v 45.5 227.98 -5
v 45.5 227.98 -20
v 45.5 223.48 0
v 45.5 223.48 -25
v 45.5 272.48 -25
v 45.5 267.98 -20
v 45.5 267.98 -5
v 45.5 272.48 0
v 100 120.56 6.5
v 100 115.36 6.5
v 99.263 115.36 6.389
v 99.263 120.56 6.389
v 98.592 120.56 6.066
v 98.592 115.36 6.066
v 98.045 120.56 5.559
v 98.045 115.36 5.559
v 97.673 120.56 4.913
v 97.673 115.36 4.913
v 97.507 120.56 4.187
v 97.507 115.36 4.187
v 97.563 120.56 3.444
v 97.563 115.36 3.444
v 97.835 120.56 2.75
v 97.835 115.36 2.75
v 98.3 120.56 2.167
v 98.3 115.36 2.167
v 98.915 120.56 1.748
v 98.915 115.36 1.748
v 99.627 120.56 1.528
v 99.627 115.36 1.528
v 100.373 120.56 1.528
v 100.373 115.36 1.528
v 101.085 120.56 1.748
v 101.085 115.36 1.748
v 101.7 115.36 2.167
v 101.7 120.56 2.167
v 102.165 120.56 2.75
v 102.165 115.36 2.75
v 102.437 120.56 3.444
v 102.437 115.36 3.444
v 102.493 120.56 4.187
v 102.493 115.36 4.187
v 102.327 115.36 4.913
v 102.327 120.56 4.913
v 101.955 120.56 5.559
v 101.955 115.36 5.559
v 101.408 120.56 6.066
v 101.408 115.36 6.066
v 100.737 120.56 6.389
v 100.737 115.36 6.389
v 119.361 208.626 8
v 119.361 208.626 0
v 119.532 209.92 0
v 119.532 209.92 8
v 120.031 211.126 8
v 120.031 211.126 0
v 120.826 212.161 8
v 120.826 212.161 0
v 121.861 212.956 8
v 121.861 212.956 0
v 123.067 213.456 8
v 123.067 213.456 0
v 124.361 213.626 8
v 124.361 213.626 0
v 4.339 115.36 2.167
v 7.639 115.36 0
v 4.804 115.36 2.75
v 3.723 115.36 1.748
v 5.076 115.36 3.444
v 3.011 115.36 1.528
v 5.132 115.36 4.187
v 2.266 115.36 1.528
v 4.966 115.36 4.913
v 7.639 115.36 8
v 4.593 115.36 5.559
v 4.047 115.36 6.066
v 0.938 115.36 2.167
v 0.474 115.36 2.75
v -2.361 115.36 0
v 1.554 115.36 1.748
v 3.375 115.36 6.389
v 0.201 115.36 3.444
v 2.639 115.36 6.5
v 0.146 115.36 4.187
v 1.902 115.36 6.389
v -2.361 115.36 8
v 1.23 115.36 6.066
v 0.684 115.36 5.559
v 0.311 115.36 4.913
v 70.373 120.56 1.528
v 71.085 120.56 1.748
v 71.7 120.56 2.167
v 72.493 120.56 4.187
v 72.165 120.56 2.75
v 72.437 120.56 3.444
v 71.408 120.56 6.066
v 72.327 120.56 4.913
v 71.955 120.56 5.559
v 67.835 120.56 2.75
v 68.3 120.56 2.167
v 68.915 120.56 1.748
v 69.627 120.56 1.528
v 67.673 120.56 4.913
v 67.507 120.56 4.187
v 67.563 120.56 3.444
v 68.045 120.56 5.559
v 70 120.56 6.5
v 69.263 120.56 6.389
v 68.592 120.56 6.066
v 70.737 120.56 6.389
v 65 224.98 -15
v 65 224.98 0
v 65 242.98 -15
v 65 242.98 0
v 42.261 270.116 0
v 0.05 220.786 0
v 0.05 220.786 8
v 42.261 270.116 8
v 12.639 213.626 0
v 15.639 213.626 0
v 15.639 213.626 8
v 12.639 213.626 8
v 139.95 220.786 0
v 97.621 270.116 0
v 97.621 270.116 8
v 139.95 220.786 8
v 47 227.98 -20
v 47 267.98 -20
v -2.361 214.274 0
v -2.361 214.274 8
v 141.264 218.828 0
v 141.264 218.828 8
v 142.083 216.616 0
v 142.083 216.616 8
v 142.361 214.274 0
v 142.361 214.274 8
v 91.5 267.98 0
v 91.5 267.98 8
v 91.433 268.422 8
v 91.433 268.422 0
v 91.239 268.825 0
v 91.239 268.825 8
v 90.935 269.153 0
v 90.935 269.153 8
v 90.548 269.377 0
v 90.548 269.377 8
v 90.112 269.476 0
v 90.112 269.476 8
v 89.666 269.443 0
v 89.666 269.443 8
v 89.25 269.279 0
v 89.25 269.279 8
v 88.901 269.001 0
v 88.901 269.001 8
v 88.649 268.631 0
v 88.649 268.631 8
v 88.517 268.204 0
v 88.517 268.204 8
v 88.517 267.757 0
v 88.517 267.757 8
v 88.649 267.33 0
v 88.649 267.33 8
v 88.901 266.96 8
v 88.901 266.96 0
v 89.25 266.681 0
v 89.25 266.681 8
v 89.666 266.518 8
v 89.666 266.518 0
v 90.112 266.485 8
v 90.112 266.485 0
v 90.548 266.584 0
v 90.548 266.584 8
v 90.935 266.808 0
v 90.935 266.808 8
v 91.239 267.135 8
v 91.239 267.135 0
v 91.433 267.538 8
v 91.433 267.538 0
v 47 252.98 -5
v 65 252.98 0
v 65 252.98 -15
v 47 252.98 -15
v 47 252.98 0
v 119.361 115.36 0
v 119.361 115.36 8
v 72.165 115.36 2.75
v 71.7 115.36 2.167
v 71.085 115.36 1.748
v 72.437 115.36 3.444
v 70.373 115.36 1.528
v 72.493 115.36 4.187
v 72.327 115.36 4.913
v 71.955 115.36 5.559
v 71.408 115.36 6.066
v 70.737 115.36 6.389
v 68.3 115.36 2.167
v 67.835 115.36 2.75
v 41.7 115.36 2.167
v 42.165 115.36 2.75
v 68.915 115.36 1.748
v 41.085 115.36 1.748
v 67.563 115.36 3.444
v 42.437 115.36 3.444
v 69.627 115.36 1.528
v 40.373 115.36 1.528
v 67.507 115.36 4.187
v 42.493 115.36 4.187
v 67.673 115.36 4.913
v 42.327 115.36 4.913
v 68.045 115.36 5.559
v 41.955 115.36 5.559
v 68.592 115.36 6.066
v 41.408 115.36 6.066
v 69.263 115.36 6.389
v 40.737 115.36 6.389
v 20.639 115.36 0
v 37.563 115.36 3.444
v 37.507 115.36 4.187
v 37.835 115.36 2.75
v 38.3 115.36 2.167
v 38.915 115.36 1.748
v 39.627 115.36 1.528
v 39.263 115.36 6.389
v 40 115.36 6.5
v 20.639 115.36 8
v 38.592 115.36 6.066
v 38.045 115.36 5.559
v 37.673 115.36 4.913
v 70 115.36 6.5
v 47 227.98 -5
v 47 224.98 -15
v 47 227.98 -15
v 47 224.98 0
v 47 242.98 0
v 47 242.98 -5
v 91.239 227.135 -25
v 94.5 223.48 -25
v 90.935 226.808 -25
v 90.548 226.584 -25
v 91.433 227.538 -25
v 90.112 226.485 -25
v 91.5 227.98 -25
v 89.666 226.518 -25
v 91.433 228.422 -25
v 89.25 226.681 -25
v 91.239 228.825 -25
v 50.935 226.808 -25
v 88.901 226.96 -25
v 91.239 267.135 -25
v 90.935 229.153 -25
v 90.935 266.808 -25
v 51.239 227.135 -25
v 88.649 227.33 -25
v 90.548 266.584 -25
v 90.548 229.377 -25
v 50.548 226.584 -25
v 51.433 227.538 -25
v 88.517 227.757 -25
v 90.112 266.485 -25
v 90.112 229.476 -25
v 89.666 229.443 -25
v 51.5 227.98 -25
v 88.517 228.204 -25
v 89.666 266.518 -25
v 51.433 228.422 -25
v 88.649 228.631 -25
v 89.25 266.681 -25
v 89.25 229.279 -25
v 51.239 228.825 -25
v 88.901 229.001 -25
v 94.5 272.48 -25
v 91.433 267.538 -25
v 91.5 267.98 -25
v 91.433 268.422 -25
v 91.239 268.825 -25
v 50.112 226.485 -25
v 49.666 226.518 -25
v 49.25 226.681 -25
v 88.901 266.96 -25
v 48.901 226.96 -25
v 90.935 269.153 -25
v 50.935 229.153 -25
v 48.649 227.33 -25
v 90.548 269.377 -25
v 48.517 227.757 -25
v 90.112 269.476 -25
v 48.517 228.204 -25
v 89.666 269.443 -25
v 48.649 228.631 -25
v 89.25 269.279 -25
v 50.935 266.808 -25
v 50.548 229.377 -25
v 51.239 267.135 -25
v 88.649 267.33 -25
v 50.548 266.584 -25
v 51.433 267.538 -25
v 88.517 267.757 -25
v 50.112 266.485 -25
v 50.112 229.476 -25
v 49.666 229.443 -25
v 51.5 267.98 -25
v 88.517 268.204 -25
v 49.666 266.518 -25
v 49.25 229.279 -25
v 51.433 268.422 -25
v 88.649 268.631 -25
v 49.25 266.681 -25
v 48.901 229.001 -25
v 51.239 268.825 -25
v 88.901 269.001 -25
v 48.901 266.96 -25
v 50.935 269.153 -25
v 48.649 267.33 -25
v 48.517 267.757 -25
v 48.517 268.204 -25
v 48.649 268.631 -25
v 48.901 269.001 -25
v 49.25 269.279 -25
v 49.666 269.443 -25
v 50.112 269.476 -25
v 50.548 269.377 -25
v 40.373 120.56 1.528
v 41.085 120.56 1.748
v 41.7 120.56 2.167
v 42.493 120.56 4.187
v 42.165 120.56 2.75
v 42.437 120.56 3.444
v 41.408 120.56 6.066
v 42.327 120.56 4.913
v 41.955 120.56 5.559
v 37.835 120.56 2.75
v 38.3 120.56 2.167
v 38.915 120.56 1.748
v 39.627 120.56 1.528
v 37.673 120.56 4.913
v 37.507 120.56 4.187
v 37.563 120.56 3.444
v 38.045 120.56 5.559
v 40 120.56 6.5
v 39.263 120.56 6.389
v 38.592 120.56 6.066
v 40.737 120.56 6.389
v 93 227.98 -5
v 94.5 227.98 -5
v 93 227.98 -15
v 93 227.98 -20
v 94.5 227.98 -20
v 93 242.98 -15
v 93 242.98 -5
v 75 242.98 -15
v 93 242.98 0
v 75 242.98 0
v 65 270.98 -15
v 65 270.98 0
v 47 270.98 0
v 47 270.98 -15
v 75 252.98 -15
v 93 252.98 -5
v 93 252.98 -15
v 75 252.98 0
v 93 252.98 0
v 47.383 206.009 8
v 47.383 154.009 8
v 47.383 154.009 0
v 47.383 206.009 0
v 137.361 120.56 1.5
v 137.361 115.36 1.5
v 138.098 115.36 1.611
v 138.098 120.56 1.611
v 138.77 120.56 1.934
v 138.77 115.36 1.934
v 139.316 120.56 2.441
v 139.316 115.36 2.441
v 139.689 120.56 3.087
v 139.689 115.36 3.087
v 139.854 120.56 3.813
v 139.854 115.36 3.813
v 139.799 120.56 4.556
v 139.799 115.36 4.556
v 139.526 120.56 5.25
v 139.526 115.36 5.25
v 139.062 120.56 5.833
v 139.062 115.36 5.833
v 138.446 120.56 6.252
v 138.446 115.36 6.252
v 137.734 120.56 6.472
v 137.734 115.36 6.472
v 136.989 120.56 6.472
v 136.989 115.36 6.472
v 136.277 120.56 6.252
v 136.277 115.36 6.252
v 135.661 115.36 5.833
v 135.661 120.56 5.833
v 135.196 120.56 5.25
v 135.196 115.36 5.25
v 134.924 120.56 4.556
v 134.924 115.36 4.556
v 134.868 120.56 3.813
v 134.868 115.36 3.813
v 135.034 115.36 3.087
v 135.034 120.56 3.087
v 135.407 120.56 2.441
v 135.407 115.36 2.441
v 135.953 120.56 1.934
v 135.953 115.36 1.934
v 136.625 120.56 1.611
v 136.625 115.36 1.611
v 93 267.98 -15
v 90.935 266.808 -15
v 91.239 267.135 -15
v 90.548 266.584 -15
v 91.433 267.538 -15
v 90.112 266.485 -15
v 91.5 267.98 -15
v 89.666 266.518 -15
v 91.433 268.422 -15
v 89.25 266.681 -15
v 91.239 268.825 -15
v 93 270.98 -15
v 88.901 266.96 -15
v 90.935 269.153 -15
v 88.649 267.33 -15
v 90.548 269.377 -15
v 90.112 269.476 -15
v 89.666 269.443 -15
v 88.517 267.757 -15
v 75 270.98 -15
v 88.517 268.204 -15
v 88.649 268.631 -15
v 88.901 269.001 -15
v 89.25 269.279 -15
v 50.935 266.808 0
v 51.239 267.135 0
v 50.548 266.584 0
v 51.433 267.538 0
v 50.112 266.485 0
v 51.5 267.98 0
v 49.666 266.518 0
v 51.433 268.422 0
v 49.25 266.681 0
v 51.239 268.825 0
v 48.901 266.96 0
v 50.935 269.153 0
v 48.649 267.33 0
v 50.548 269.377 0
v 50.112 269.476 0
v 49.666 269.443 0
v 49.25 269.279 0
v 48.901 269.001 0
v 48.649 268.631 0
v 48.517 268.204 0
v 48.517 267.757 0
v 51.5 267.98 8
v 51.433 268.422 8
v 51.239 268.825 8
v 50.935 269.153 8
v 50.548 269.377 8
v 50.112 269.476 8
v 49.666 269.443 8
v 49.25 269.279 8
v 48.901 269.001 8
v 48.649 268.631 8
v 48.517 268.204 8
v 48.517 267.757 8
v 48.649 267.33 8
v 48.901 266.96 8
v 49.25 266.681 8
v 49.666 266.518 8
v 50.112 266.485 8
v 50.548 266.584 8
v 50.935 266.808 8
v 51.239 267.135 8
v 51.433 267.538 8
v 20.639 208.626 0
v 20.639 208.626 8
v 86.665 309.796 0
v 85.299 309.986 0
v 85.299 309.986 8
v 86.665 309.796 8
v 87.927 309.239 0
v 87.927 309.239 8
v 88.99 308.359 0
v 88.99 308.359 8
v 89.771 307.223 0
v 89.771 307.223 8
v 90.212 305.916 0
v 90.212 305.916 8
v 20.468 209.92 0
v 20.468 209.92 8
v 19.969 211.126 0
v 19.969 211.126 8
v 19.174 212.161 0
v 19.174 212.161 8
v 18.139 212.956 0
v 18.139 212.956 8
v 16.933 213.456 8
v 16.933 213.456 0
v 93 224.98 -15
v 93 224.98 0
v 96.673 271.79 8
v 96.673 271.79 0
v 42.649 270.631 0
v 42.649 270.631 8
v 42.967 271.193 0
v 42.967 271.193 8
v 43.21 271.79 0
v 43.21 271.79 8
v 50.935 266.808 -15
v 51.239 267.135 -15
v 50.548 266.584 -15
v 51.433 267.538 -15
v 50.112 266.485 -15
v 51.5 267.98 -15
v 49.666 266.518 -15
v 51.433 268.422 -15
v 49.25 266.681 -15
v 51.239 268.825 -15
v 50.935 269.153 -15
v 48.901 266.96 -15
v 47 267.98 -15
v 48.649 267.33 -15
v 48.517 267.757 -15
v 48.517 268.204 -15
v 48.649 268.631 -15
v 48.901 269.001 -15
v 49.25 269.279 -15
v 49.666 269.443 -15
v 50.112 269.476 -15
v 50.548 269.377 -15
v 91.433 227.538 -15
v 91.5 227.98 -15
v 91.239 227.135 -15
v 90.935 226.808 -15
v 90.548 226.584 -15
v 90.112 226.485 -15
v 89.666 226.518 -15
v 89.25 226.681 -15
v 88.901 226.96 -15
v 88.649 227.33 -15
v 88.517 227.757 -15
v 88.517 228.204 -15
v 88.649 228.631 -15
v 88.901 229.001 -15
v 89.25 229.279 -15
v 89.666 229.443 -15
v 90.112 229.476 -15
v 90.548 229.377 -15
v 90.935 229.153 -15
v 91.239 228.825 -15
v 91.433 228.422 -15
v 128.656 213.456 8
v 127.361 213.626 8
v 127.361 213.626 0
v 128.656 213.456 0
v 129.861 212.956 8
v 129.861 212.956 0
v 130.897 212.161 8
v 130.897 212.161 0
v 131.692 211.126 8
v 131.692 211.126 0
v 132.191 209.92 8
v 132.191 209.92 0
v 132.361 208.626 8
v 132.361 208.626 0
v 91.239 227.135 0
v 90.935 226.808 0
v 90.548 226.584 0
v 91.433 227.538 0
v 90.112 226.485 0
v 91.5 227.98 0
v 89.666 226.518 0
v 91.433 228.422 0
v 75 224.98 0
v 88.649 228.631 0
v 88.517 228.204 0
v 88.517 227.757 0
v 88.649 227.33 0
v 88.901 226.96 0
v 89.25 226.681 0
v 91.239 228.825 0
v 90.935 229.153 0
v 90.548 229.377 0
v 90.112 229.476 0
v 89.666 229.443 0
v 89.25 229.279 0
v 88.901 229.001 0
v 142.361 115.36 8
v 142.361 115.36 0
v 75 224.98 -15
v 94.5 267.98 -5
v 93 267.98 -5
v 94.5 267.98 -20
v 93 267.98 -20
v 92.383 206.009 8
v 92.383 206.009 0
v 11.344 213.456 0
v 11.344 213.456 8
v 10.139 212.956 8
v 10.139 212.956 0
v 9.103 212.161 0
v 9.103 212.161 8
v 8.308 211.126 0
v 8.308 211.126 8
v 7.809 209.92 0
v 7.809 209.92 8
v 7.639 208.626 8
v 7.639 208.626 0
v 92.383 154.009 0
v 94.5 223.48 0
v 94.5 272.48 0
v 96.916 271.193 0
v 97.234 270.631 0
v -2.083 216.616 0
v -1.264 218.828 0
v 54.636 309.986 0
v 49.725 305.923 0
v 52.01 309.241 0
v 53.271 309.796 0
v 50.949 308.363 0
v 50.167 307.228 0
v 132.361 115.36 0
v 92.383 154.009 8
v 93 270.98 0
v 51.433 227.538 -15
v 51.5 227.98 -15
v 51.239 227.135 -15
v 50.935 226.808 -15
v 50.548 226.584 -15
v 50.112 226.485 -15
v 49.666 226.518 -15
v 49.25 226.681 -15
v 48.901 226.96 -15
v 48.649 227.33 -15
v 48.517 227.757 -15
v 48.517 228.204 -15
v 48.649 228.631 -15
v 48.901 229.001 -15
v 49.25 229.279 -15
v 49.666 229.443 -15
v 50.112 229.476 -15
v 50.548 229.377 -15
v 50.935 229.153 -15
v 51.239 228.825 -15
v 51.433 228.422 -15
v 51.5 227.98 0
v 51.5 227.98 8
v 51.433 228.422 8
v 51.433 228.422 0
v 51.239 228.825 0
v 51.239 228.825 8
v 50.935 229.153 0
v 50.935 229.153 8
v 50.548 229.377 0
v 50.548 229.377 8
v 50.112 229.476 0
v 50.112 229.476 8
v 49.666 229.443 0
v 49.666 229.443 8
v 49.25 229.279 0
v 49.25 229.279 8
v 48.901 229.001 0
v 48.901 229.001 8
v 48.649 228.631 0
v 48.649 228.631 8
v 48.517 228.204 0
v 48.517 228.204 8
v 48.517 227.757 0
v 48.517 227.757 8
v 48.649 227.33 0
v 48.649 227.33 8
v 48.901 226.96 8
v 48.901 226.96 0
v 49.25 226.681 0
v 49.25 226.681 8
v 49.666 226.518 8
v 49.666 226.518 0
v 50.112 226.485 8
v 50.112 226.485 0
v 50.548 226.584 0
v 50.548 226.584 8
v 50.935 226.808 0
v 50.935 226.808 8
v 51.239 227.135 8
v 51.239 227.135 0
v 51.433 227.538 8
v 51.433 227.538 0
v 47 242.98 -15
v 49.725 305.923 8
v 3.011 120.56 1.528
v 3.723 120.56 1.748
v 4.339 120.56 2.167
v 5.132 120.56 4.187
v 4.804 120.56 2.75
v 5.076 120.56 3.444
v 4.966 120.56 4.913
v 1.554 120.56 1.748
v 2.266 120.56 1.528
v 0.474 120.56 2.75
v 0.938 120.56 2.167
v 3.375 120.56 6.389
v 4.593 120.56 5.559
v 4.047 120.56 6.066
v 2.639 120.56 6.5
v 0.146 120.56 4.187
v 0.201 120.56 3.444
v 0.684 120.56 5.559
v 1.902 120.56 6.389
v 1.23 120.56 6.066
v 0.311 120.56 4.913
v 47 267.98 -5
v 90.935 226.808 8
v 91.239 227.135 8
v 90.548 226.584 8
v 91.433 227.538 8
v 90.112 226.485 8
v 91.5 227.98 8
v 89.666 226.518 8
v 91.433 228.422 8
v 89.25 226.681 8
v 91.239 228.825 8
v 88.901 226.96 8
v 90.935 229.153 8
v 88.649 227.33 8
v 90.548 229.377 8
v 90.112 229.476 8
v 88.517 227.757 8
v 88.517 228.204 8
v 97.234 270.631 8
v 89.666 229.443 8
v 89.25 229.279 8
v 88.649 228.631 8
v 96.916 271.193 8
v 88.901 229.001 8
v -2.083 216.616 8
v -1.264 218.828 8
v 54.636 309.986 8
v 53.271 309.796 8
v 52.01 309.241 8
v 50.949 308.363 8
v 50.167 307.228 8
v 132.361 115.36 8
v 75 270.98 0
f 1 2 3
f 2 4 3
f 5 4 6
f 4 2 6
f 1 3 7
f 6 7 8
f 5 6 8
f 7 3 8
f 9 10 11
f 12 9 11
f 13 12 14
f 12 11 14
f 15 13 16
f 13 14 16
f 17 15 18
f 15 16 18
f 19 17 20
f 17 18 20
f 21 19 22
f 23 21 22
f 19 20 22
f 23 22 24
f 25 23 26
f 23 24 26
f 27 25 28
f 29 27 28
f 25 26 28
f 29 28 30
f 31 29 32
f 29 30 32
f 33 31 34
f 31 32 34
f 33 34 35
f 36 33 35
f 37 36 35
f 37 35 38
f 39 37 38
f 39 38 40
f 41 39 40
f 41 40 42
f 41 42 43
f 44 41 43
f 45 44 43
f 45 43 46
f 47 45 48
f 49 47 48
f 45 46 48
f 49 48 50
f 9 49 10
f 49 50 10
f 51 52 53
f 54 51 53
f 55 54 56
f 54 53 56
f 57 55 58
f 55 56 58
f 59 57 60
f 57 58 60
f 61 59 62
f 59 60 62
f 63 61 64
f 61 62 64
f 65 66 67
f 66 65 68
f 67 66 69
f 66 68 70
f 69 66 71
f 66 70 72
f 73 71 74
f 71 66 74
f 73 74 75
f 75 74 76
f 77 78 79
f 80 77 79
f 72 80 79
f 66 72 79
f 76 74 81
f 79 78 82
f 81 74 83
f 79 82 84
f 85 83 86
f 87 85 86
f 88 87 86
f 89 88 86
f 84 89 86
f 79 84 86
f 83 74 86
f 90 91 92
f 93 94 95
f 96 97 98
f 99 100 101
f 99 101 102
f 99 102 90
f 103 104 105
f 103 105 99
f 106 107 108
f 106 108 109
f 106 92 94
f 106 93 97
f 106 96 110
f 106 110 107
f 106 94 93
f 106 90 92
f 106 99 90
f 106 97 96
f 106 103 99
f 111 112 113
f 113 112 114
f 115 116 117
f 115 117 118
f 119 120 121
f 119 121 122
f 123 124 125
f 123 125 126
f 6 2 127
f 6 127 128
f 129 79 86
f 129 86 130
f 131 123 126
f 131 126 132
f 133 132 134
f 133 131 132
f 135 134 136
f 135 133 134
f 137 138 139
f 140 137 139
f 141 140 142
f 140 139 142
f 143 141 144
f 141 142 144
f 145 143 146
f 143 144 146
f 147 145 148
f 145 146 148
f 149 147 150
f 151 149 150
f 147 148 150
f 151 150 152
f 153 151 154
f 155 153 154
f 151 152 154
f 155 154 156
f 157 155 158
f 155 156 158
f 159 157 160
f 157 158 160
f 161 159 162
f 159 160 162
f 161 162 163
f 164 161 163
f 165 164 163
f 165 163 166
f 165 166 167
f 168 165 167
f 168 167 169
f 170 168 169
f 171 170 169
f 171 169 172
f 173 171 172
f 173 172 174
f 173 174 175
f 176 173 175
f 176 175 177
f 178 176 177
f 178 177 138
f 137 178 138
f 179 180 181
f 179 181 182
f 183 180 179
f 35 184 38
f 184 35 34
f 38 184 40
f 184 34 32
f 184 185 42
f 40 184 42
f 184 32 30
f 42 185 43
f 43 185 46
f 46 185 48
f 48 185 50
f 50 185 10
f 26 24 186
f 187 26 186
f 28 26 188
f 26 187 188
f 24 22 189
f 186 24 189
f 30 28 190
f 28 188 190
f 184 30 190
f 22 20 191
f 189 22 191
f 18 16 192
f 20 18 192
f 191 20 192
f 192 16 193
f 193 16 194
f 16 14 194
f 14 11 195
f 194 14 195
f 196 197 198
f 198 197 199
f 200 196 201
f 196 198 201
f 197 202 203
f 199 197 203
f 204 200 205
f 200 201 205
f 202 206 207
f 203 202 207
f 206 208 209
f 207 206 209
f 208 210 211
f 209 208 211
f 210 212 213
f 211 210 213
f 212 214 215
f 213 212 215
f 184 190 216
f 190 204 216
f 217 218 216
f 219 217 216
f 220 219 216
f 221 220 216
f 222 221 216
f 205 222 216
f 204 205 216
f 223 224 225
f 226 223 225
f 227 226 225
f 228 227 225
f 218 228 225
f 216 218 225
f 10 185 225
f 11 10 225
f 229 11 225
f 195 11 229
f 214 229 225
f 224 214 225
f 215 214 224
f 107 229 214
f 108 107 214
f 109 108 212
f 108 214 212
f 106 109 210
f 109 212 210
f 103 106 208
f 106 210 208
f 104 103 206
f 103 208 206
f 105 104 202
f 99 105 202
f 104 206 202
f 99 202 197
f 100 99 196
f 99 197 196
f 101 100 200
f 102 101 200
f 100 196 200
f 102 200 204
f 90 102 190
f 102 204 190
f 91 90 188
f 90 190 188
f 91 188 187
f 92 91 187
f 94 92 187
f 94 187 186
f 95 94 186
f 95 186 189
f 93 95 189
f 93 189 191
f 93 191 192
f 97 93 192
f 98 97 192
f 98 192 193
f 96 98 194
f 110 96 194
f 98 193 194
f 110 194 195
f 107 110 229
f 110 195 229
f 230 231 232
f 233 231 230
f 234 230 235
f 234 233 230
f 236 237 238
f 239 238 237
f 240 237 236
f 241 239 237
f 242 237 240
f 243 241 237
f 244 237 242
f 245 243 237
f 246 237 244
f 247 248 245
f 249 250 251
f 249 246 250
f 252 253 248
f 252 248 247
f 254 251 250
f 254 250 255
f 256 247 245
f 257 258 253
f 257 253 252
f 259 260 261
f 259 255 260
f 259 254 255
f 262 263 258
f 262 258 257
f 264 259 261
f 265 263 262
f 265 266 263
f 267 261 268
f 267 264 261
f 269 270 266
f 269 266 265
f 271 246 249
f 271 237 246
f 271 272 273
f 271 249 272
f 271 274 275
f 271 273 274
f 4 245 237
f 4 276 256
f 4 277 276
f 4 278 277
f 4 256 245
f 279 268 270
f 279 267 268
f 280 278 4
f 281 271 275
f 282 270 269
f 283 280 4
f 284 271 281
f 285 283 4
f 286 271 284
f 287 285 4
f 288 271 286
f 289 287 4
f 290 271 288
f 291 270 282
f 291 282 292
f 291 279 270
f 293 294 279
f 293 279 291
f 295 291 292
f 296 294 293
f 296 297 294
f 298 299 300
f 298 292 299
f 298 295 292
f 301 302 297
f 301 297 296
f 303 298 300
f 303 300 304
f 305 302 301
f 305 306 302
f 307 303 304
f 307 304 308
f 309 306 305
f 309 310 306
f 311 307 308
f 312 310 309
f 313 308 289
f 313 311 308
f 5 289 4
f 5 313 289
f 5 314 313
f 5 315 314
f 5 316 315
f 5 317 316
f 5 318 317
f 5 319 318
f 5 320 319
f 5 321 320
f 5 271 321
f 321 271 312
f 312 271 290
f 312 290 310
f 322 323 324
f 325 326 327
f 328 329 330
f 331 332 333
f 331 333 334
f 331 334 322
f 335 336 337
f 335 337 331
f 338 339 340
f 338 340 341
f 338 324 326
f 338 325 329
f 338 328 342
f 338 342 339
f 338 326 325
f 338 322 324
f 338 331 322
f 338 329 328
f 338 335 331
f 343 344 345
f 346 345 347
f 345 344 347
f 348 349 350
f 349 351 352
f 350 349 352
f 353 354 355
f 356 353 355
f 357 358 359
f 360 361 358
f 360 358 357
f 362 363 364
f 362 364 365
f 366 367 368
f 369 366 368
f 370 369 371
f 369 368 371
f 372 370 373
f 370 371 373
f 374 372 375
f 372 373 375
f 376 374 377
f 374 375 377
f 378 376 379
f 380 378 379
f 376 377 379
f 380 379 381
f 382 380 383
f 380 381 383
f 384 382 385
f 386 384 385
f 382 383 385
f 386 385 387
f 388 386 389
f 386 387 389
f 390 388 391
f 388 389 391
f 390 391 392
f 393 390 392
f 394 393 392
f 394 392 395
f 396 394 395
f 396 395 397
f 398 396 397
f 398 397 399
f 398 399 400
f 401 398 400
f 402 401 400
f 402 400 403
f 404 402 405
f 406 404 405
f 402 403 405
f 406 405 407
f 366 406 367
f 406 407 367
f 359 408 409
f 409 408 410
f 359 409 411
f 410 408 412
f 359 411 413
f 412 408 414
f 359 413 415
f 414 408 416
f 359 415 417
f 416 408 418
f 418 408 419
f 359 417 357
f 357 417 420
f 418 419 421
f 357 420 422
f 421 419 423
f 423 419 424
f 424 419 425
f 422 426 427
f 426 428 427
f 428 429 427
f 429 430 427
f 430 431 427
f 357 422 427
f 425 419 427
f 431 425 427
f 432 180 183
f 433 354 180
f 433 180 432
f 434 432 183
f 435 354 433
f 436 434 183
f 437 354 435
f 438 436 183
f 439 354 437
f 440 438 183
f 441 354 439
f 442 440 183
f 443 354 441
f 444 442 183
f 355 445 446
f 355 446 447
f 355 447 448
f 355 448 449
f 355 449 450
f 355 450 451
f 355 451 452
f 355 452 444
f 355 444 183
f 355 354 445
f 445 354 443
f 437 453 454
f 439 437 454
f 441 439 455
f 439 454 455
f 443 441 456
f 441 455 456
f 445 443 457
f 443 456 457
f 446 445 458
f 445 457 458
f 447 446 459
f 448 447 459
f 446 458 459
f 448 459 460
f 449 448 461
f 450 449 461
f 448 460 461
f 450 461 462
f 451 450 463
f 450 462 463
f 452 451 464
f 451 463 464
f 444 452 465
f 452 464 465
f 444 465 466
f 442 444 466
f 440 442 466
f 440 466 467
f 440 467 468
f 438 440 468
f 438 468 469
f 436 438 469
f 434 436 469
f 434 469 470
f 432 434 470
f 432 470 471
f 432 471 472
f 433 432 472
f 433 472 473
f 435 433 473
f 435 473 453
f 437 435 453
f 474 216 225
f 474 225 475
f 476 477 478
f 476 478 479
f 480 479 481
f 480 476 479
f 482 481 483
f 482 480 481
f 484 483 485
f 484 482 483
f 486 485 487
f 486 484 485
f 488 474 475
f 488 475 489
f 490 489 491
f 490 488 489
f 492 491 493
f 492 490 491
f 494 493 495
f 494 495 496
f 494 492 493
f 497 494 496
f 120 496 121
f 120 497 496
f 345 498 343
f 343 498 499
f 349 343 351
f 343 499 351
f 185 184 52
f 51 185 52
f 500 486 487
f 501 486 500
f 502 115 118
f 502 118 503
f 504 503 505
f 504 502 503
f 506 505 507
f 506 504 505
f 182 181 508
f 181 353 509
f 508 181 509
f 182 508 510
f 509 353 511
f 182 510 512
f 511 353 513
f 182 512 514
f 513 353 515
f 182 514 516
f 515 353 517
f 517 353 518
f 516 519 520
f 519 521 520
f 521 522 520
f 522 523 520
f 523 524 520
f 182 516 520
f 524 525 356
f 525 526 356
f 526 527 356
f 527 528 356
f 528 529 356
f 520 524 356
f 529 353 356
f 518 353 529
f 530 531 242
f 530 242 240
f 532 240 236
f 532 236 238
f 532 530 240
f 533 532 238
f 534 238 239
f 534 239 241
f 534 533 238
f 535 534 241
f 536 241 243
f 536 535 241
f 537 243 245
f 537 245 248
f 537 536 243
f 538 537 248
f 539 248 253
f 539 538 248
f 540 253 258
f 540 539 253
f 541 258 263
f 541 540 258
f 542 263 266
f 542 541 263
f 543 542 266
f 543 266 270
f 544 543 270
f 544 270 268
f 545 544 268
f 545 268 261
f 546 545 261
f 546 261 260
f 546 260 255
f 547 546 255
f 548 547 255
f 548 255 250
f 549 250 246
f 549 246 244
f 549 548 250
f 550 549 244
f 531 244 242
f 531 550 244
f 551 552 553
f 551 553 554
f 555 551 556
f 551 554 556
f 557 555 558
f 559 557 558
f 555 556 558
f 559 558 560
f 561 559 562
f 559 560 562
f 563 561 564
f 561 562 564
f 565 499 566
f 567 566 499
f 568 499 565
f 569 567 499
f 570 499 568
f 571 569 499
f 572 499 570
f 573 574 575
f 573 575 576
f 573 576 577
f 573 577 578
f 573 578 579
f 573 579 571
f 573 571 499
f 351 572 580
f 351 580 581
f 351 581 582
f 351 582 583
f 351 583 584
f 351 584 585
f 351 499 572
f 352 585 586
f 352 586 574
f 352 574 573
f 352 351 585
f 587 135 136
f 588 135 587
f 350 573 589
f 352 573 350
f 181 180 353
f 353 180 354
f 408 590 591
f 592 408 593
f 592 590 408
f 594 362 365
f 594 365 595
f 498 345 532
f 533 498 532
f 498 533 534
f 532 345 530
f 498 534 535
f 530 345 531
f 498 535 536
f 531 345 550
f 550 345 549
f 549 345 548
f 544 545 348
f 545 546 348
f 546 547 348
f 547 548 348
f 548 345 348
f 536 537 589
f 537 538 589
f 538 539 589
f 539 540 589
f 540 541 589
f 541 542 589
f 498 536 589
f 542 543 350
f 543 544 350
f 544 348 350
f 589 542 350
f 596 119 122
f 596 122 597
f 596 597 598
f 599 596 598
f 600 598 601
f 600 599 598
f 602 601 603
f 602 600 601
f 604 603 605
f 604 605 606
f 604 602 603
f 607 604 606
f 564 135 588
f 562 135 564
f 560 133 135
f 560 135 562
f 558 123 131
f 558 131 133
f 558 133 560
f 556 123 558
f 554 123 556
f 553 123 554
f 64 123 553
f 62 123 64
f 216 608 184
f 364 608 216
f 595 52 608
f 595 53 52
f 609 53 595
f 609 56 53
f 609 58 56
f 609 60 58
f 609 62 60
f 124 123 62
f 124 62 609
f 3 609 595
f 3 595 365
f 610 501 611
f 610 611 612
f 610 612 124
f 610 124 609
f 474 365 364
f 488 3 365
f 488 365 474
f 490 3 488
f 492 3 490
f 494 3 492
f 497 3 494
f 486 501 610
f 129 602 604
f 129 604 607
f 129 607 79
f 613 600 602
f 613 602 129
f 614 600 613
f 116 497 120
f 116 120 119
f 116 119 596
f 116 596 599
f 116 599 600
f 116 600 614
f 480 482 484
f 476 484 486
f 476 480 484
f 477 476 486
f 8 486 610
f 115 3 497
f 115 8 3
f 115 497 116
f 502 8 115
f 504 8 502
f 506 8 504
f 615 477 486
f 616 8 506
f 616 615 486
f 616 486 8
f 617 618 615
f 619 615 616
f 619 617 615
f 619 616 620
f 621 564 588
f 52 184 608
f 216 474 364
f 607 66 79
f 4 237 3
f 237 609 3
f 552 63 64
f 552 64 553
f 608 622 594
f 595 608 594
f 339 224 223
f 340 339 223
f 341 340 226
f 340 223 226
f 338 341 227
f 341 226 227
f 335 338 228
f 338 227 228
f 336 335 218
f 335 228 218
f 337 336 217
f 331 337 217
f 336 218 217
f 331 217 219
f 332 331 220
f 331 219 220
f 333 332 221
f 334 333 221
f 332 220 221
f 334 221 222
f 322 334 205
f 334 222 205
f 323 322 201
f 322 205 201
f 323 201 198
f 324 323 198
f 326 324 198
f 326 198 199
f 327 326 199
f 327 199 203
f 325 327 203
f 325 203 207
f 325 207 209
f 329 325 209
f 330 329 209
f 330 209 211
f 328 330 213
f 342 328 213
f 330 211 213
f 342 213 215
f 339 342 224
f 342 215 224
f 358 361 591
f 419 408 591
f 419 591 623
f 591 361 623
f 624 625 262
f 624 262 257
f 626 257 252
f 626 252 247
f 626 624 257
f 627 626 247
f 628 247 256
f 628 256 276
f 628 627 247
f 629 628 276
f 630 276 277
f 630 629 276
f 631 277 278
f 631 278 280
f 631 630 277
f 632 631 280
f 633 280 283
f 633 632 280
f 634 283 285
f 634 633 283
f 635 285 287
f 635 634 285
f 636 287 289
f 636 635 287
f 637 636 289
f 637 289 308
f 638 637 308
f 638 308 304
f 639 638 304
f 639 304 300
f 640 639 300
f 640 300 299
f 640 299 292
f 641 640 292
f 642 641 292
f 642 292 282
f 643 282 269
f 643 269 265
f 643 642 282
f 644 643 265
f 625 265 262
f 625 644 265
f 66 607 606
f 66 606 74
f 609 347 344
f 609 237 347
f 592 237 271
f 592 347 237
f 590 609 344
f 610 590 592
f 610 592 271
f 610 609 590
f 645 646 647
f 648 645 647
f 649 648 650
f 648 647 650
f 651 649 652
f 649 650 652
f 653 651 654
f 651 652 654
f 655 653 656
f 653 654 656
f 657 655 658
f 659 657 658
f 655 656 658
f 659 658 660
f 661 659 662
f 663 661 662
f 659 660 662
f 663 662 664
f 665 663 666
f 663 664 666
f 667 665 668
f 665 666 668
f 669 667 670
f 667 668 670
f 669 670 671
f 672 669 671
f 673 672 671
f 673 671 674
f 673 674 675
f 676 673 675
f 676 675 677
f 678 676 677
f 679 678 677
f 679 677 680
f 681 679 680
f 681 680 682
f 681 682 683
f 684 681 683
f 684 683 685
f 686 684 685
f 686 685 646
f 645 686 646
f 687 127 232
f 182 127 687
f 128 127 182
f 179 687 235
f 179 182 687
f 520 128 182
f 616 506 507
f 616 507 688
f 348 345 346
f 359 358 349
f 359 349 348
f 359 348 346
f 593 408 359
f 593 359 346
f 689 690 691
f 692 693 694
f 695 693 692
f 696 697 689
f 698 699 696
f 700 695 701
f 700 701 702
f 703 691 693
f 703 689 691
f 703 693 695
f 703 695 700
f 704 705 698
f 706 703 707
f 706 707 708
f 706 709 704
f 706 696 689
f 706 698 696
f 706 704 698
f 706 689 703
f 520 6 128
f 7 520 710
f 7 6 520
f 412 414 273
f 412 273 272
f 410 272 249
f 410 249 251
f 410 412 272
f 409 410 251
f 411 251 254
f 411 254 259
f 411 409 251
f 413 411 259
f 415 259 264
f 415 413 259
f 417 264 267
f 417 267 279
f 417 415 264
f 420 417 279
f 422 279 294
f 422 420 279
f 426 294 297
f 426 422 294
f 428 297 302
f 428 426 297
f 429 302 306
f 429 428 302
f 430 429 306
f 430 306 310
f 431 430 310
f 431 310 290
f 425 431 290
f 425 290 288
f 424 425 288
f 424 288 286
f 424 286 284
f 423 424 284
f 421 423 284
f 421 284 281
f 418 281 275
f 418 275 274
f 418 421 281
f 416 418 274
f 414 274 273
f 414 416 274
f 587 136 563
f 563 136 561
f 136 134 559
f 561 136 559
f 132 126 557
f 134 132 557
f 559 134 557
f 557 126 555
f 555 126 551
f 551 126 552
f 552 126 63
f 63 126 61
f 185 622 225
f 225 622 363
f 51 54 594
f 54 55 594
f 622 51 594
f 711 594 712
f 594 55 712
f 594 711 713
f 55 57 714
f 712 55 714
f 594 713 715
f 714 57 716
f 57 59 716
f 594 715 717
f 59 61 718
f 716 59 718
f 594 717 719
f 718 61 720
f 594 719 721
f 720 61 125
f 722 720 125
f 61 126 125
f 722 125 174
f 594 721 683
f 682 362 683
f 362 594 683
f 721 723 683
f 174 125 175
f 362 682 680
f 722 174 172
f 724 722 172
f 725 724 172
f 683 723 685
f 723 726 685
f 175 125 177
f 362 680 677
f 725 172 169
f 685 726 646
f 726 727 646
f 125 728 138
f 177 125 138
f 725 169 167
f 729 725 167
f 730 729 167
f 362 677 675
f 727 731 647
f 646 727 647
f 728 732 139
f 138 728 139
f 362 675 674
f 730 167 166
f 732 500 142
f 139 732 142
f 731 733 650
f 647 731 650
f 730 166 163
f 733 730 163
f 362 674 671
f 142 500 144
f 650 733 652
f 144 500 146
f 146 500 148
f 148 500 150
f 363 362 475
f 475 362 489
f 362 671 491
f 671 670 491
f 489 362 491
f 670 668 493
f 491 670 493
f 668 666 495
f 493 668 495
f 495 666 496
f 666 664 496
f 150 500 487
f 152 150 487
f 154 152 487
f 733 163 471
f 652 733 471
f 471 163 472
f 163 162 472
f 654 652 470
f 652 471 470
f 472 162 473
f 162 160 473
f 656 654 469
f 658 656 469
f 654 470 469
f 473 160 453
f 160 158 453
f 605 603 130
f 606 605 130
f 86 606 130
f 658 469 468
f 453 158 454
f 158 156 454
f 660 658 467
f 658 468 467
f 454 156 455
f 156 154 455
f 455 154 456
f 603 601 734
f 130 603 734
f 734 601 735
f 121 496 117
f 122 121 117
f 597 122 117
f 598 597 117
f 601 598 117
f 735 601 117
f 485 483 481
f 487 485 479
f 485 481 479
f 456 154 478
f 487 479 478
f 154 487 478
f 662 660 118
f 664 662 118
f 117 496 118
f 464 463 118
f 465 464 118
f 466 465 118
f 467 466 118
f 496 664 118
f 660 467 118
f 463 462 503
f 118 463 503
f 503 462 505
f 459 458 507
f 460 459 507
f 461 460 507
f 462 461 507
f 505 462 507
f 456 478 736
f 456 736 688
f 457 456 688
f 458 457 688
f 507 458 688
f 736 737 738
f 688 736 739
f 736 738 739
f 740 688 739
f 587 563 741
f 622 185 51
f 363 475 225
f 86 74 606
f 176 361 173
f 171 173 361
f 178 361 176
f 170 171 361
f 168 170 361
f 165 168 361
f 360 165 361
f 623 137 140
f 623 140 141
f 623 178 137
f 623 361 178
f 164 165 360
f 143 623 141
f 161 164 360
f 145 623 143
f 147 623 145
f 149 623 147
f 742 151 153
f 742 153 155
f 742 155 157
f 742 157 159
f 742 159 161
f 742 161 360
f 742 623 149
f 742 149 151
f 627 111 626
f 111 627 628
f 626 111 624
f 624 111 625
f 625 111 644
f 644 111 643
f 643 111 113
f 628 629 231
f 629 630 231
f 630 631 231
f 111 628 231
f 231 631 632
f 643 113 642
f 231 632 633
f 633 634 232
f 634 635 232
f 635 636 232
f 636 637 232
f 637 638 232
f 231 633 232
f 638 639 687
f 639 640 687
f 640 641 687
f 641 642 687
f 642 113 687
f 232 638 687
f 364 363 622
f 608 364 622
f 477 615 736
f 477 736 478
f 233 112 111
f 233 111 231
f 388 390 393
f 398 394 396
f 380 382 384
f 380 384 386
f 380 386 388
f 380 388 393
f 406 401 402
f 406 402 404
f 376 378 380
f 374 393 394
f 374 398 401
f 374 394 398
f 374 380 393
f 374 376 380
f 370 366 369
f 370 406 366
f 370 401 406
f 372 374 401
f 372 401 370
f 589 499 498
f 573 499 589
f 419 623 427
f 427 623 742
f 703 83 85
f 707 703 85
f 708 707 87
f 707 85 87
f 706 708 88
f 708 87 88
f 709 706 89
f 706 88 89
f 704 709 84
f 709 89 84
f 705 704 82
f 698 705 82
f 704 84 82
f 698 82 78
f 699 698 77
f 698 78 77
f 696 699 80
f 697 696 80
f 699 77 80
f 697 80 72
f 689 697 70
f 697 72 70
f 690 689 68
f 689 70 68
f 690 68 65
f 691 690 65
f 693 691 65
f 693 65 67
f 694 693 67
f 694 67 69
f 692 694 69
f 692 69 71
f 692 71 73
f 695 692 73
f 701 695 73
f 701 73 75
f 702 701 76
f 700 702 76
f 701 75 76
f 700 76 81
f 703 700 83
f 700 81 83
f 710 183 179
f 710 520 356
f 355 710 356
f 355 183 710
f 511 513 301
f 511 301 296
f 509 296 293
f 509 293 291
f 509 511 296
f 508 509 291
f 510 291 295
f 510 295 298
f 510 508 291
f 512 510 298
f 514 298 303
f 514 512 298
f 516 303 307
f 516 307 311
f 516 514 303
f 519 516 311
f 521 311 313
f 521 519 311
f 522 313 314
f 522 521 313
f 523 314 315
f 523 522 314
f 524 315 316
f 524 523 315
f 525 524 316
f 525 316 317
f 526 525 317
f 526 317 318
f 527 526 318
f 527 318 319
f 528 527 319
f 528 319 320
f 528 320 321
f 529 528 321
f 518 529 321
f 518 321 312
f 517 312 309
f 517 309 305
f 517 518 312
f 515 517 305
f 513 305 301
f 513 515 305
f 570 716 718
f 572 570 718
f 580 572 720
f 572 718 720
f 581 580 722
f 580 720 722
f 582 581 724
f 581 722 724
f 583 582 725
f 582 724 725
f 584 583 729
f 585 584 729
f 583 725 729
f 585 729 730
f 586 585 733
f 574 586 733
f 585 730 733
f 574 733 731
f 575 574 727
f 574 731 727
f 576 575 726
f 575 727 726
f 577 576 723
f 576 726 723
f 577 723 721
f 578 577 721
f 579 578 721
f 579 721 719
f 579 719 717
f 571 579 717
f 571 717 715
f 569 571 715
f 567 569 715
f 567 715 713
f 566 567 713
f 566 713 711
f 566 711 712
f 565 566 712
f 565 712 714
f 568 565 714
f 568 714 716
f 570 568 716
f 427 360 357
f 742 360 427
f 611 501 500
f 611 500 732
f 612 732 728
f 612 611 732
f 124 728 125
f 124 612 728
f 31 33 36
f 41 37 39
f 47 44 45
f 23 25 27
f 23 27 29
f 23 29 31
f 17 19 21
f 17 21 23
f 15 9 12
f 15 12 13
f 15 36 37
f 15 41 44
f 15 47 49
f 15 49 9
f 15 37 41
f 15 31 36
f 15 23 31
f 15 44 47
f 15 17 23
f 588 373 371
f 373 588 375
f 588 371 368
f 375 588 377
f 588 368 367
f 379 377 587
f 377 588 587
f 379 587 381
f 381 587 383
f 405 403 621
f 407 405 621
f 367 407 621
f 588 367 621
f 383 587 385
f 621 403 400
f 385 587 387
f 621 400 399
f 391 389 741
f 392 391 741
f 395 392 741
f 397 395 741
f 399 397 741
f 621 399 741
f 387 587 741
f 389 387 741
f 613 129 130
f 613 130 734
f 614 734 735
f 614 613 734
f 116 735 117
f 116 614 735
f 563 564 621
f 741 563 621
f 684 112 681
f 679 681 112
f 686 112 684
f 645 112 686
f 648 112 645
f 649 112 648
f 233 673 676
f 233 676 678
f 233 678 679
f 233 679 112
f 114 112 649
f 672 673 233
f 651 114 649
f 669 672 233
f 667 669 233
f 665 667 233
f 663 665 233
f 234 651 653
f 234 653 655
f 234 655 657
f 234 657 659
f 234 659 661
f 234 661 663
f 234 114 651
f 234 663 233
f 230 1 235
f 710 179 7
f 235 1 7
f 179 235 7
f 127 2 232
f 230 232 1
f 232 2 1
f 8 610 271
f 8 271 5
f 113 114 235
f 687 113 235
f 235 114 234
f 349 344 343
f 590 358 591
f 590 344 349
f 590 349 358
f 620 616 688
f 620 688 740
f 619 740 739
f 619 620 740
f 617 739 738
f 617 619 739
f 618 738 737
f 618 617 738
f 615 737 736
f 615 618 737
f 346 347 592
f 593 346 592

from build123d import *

# Parameters (mm, degrees)
BOSS_EXTRUDE1_DEPTH    = 8
SKETCH2_W              = 45
SKETCH2_H              = 52
CUT_EXTRUDE1_DEPTH     = 342.206659287
SPLIT1_SURFACE_1_BACK  = 343.199
SPLIT1_SURFACE_1_DEPTH = 686.398
SPLIT1_SURFACE_2_BACK  = 343.199
SPLIT1_SURFACE_2_DEPTH = 686.398
SKETCH5_R              = 2.5
CUT_EXTRUDE6_DEPTH     = 5.2
SKETCH4_R              = 2.5
CUT_EXTRUDE7_DEPTH     = 5.2
SKETCH6_R              = 1.5
CUT_EXTRUDE8_DEPTH     = 342.206659287
SKETCH7_W              = 49
SKETCH7_H              = 49
SKETCH7_W_2            = 18
SKETCH7_H_2            = 18
BOSS_EXTRUDE2_DEPTH    = 15
SKETCH8_W              = 49
SKETCH8_H              = 49
SKETCH8_R              = 1.5
BOSS_EXTRUDE3_DEPTH    = 10
SKETCH9_W              = 15
SKETCH9_H              = 40
CUT_EXTRUDE9_DEPTH     = 1.5
SKETCH11_W             = 15
SKETCH11_H             = 40
CUT_EXTRUDE10_DEPTH    = 1.5


with BuildPart() as part:
    # Sketch1 → Boss-Extrude1 (new body)
    with BuildSketch(Plane.XY):
        with BuildLine():
            Line((70, 309.985818768), (85.299227191, 309.985818768))
            ThreePointArc((85.299227191, 309.985818768), (88.489017574, 308.836174247), (90.211957942, 305.915913694))
            Line((90.211957942, 305.915913694), (96.672728921, 271.790334282))
            ThreePointArc((96.672728921, 271.790334282), (97.06575438, 270.906904614), (97.621470019, 270.115641625))
            Line((97.621470019, 270.115641625), (139.950460317, 220.786053348))
            ThreePointArc((139.950460317, 220.786053348), (141.739336996, 217.746026552), (142.361429131, 214.274017901))
            Line((142.361429131, 214.274017901), (142.361429131, 30.859943174))
            ThreePointArc((142.361429131, 30.859943174), (140.896963037, 27.324409268), (137.361429131, 25.859943174))
            Line((137.361429131, 25.859943174), (114.717190871, 25.782318449))
            ThreePointArc((114.717190871, 25.782318449), (112.681998989, 25.341726514), (111.002773989, 24.110332733))
            Line((111.002773989, 24.110332733), (89.38285929, 0))
            Line((89.38285929, 0), (50.5, 0))
            Line((50.5, 0), (28.997226011, 24.110332733))
            ThreePointArc((28.997226011, 24.110332733), (27.318001011, 25.341726514), (25.282809129, 25.782318449))
            Line((25.282809129, 25.782318449), (2.638570869, 25.859943174))
            ThreePointArc((2.638570869, 25.859943174), (-0.896963037, 27.324409268), (-2.361429131, 30.859943174))
            Line((-2.361429131, 30.859943174), (-2.361429131, 214.274017901))
            ThreePointArc((-2.361429131, 214.274017901), (-1.739336996, 217.746026552), (0.049539683, 220.786053348))
            Line((0.049539683, 220.786053348), (42.261389271, 270.115641625))
            ThreePointArc((42.261389271, 270.115641625), (42.81710491, 270.906904614), (43.210130369, 271.790334282))
            Line((43.210130369, 271.790334282), (49.724618218, 305.923183314))
            ThreePointArc((49.724618218, 305.923183314), (51.449026762, 308.838533573), (54.635967087, 309.985818768))
            Line((54.635967087, 309.985818768), (70, 309.985818768))
        make_face()
        with BuildLine():
            Line((7.638570869, 35.492492662), (20.638570869, 35.492492662))
            Line((20.638570869, 35.492492662), (20.638570869, 208.625959477))
            ThreePointArc((20.638570869, 208.625959477), (19.174104775, 212.161493383), (15.638570869, 213.625959477))
            Line((15.638570869, 213.625959477), (12.638570869, 213.625959477))
            ThreePointArc((12.638570869, 213.625959477), (9.103036963, 212.161493383), (7.638570869, 208.625959477))
            Line((7.638570869, 208.625959477), (7.638570869, 35.492492662))
        make_face(mode=Mode.SUBTRACT)
        with BuildLine():
            Line((127.361429131, 35.492492662), (124.361429131, 35.492492662))
            ThreePointArc((124.361429131, 35.492492662), (120.825895225, 36.956958756), (119.361429131, 40.492492662))
            Line((119.361429131, 40.492492662), (119.361429131, 208.625959477))
            ThreePointArc((119.361429131, 208.625959477), (120.825895225, 212.161493383), (124.361429131, 213.625959477))
            Line((124.361429131, 213.625959477), (127.361429131, 213.625959477))
            ThreePointArc((127.361429131, 213.625959477), (130.896963037, 212.161493383), (132.361429131, 208.625959477))
            Line((132.361429131, 208.625959477), (132.361429131, 40.492492662))
            ThreePointArc((132.361429131, 40.492492662), (130.896963037, 36.956958756), (127.361429131, 35.492492662))
        make_face(mode=Mode.SUBTRACT)
    extrude(amount=BOSS_EXTRUDE1_DEPTH)

    # Sketch2 → Cut-Extrude1 (cut, through all)
    with BuildSketch(Plane.XY.offset(8)):
        with Locations((69.88285929, 180.008918923)):
            Rectangle(SKETCH2_W, SKETCH2_H)
    extrude(amount=-CUT_EXTRUDE1_DEPTH, mode=Mode.SUBTRACT)


with BuildPart() as body_2:
    # Split1: the piece behind the surface
    add(part.part)
    # Split1 surface: a surface, the sketch's curves swept straight by 686.398 mm
    with BuildLine(Plane(origin=(0, 0, 0), x_dir=(-1, 0, 0), z_dir=(0, 0, -1)).offset(-SPLIT1_SURFACE_1_BACK), mode=Mode.PRIVATE) as split1_surface_1_path:
        Line((-142.361429131, 115.359943174), (2.361429131, 115.359943174))
    split1_surface_1 = Shell.extrude(split1_surface_1_path.wire(), (0 * SPLIT1_SURFACE_1_DEPTH, 0 * SPLIT1_SURFACE_1_DEPTH, -1 * SPLIT1_SURFACE_1_DEPTH))
    split(bisect_by=split1_surface_1, keep=Keep.BOTTOM)

    # Sketch5 → Cut-Extrude6 (cut)
    with BuildSketch(Plane(origin=(0, 115.359943174, -115.359943174), x_dir=(1, 0, 0), z_dir=(0, -1, 0))):
        with Locations(Location((70, 119.359943174, 0), (0, 0, 270))):
            Circle(SKETCH5_R)
        with Locations(Location((40, 119.359943174, 0), (0, 0, 270))):
            Circle(SKETCH5_R)
        with Locations(Location((2.638570869, 119.359943174, 0), (0, 0, 270))):
            Circle(SKETCH5_R)
    extrude(amount=CUT_EXTRUDE6_DEPTH, mode=Mode.SUBTRACT)


with BuildPart() as part_1:
    add(part.part)

    # Split1: split by a surface, the side it looks to stays
    # Split1 surface: a surface, the sketch's curves swept straight by 686.398 mm
    with BuildLine(Plane(origin=(0, 0, 0), x_dir=(-1, 0, 0), z_dir=(0, 0, -1)).offset(-SPLIT1_SURFACE_2_BACK), mode=Mode.PRIVATE) as split1_surface_2_path:
        Line((-142.361429131, 115.359943174), (2.361429131, 115.359943174))
    split1_surface_2 = Shell.extrude(split1_surface_2_path.wire(), (0 * SPLIT1_SURFACE_2_DEPTH, 0 * SPLIT1_SURFACE_2_DEPTH, -1 * SPLIT1_SURFACE_2_DEPTH))
    split(bisect_by=split1_surface_2, keep=Keep.TOP)

    # Sketch4 → Cut-Extrude7 (cut)
    with BuildSketch(Plane(origin=(0, 115.359943174, 0), x_dir=(-1, 0, 0), z_dir=(0, -1, 0))):
        with Locations(Location((-70, -4, 0), (0, 0, 270))):
            Circle(SKETCH4_R)
        with Locations(Location((-40, -4, 0), (0, 0, 270))):
            Circle(SKETCH4_R)
        with Locations(Location((-100, -4, 0), (0, 0, 270))):
            Circle(SKETCH4_R)
        with Locations(Location((-137.361429131, -4, 0), (0, 0, 90))):
            Circle(SKETCH4_R)
        with Locations(Location((-2.638570869, -4, 0), (0, 0, 270))):
            Circle(SKETCH4_R)
    extrude(amount=-CUT_EXTRUDE7_DEPTH, mode=Mode.SUBTRACT)

    # Sketch6 → Cut-Extrude8 (cut, through all)
    with BuildSketch(Plane.XY.offset(8)):
        with Locations((50.000130369, 267.980334282)):
            Circle(SKETCH6_R)
        with Locations((90.000130369, 267.980334282)):
            Circle(SKETCH6_R)
        with Locations((90.000130369, 227.980334282)):
            Circle(SKETCH6_R)
        with Locations((50.000130369, 227.980334282)):
            Circle(SKETCH6_R)
    extrude(amount=-CUT_EXTRUDE8_DEPTH, mode=Mode.SUBTRACT)

    # Sketch7 → Boss-Extrude2 (add)
    with BuildSketch(Plane(origin=(0, 0, 0), x_dir=(-1, 0, 0), z_dir=(0, 0, -1))):
        with Locations((-70.000130369, 247.980334282)):
            Rectangle(SKETCH7_W, SKETCH7_H)
        with Locations((-56.000130369, 261.980334282)):
            Rectangle(SKETCH7_W_2, SKETCH7_H_2, mode=Mode.SUBTRACT)
        with Locations((-84.000130369, 261.980334282)):
            Rectangle(SKETCH7_W_2, SKETCH7_H_2, mode=Mode.SUBTRACT)
        with Locations((-84.000130369, 233.980334282)):
            Rectangle(SKETCH7_W_2, SKETCH7_H_2, mode=Mode.SUBTRACT)
        with Locations((-56.000130369, 233.980334282)):
            Rectangle(SKETCH7_W_2, SKETCH7_H_2, mode=Mode.SUBTRACT)
    extrude(amount=BOSS_EXTRUDE2_DEPTH)

    # Sketch8 → Boss-Extrude3 (add)
    with BuildSketch(Plane(origin=(0, 0, -15), x_dir=(-1, 0, 0), z_dir=(0, 0, -1))):
        with Locations((-70.000130369, 247.980334282)):
            Rectangle(SKETCH8_W, SKETCH8_H)
        with Locations(Location((-50.000130369, 267.980334282, 0), (0, 0, 180))):
            Circle(SKETCH8_R, mode=Mode.SUBTRACT)
        with Locations(Location((-90.000130369, 267.980334282, 0), (0, 0, 180))):
            Circle(SKETCH8_R, mode=Mode.SUBTRACT)
        with Locations(Location((-50.000130369, 227.980334282, 0), (0, 0, 180))):
            Circle(SKETCH8_R, mode=Mode.SUBTRACT)
        with Locations(Location((-90.000130369, 227.980334282, 0), (0, 0, 180))):
            Circle(SKETCH8_R, mode=Mode.SUBTRACT)
    extrude(amount=BOSS_EXTRUDE3_DEPTH)

    # Sketch9 → Cut-Extrude9 (cut)
    with BuildSketch(Plane.ZY.offset(-45.500130369)):
        with Locations((-12.5, 247.980334282)):
            Rectangle(SKETCH9_W, SKETCH9_H)
    extrude(amount=-CUT_EXTRUDE9_DEPTH, mode=Mode.SUBTRACT)

    # Sketch11 → Cut-Extrude10 (cut)
    with BuildSketch(Plane(origin=(94.500130369, 0, 0), x_dir=(0, 0, -1), z_dir=(1, 0, 0))):
        with Locations((12.5, 247.980334282)):
            Rectangle(SKETCH11_W, SKETCH11_H)
    extrude(amount=-CUT_EXTRUDE10_DEPTH, mode=Mode.SUBTRACT)


solid = part_1.part
